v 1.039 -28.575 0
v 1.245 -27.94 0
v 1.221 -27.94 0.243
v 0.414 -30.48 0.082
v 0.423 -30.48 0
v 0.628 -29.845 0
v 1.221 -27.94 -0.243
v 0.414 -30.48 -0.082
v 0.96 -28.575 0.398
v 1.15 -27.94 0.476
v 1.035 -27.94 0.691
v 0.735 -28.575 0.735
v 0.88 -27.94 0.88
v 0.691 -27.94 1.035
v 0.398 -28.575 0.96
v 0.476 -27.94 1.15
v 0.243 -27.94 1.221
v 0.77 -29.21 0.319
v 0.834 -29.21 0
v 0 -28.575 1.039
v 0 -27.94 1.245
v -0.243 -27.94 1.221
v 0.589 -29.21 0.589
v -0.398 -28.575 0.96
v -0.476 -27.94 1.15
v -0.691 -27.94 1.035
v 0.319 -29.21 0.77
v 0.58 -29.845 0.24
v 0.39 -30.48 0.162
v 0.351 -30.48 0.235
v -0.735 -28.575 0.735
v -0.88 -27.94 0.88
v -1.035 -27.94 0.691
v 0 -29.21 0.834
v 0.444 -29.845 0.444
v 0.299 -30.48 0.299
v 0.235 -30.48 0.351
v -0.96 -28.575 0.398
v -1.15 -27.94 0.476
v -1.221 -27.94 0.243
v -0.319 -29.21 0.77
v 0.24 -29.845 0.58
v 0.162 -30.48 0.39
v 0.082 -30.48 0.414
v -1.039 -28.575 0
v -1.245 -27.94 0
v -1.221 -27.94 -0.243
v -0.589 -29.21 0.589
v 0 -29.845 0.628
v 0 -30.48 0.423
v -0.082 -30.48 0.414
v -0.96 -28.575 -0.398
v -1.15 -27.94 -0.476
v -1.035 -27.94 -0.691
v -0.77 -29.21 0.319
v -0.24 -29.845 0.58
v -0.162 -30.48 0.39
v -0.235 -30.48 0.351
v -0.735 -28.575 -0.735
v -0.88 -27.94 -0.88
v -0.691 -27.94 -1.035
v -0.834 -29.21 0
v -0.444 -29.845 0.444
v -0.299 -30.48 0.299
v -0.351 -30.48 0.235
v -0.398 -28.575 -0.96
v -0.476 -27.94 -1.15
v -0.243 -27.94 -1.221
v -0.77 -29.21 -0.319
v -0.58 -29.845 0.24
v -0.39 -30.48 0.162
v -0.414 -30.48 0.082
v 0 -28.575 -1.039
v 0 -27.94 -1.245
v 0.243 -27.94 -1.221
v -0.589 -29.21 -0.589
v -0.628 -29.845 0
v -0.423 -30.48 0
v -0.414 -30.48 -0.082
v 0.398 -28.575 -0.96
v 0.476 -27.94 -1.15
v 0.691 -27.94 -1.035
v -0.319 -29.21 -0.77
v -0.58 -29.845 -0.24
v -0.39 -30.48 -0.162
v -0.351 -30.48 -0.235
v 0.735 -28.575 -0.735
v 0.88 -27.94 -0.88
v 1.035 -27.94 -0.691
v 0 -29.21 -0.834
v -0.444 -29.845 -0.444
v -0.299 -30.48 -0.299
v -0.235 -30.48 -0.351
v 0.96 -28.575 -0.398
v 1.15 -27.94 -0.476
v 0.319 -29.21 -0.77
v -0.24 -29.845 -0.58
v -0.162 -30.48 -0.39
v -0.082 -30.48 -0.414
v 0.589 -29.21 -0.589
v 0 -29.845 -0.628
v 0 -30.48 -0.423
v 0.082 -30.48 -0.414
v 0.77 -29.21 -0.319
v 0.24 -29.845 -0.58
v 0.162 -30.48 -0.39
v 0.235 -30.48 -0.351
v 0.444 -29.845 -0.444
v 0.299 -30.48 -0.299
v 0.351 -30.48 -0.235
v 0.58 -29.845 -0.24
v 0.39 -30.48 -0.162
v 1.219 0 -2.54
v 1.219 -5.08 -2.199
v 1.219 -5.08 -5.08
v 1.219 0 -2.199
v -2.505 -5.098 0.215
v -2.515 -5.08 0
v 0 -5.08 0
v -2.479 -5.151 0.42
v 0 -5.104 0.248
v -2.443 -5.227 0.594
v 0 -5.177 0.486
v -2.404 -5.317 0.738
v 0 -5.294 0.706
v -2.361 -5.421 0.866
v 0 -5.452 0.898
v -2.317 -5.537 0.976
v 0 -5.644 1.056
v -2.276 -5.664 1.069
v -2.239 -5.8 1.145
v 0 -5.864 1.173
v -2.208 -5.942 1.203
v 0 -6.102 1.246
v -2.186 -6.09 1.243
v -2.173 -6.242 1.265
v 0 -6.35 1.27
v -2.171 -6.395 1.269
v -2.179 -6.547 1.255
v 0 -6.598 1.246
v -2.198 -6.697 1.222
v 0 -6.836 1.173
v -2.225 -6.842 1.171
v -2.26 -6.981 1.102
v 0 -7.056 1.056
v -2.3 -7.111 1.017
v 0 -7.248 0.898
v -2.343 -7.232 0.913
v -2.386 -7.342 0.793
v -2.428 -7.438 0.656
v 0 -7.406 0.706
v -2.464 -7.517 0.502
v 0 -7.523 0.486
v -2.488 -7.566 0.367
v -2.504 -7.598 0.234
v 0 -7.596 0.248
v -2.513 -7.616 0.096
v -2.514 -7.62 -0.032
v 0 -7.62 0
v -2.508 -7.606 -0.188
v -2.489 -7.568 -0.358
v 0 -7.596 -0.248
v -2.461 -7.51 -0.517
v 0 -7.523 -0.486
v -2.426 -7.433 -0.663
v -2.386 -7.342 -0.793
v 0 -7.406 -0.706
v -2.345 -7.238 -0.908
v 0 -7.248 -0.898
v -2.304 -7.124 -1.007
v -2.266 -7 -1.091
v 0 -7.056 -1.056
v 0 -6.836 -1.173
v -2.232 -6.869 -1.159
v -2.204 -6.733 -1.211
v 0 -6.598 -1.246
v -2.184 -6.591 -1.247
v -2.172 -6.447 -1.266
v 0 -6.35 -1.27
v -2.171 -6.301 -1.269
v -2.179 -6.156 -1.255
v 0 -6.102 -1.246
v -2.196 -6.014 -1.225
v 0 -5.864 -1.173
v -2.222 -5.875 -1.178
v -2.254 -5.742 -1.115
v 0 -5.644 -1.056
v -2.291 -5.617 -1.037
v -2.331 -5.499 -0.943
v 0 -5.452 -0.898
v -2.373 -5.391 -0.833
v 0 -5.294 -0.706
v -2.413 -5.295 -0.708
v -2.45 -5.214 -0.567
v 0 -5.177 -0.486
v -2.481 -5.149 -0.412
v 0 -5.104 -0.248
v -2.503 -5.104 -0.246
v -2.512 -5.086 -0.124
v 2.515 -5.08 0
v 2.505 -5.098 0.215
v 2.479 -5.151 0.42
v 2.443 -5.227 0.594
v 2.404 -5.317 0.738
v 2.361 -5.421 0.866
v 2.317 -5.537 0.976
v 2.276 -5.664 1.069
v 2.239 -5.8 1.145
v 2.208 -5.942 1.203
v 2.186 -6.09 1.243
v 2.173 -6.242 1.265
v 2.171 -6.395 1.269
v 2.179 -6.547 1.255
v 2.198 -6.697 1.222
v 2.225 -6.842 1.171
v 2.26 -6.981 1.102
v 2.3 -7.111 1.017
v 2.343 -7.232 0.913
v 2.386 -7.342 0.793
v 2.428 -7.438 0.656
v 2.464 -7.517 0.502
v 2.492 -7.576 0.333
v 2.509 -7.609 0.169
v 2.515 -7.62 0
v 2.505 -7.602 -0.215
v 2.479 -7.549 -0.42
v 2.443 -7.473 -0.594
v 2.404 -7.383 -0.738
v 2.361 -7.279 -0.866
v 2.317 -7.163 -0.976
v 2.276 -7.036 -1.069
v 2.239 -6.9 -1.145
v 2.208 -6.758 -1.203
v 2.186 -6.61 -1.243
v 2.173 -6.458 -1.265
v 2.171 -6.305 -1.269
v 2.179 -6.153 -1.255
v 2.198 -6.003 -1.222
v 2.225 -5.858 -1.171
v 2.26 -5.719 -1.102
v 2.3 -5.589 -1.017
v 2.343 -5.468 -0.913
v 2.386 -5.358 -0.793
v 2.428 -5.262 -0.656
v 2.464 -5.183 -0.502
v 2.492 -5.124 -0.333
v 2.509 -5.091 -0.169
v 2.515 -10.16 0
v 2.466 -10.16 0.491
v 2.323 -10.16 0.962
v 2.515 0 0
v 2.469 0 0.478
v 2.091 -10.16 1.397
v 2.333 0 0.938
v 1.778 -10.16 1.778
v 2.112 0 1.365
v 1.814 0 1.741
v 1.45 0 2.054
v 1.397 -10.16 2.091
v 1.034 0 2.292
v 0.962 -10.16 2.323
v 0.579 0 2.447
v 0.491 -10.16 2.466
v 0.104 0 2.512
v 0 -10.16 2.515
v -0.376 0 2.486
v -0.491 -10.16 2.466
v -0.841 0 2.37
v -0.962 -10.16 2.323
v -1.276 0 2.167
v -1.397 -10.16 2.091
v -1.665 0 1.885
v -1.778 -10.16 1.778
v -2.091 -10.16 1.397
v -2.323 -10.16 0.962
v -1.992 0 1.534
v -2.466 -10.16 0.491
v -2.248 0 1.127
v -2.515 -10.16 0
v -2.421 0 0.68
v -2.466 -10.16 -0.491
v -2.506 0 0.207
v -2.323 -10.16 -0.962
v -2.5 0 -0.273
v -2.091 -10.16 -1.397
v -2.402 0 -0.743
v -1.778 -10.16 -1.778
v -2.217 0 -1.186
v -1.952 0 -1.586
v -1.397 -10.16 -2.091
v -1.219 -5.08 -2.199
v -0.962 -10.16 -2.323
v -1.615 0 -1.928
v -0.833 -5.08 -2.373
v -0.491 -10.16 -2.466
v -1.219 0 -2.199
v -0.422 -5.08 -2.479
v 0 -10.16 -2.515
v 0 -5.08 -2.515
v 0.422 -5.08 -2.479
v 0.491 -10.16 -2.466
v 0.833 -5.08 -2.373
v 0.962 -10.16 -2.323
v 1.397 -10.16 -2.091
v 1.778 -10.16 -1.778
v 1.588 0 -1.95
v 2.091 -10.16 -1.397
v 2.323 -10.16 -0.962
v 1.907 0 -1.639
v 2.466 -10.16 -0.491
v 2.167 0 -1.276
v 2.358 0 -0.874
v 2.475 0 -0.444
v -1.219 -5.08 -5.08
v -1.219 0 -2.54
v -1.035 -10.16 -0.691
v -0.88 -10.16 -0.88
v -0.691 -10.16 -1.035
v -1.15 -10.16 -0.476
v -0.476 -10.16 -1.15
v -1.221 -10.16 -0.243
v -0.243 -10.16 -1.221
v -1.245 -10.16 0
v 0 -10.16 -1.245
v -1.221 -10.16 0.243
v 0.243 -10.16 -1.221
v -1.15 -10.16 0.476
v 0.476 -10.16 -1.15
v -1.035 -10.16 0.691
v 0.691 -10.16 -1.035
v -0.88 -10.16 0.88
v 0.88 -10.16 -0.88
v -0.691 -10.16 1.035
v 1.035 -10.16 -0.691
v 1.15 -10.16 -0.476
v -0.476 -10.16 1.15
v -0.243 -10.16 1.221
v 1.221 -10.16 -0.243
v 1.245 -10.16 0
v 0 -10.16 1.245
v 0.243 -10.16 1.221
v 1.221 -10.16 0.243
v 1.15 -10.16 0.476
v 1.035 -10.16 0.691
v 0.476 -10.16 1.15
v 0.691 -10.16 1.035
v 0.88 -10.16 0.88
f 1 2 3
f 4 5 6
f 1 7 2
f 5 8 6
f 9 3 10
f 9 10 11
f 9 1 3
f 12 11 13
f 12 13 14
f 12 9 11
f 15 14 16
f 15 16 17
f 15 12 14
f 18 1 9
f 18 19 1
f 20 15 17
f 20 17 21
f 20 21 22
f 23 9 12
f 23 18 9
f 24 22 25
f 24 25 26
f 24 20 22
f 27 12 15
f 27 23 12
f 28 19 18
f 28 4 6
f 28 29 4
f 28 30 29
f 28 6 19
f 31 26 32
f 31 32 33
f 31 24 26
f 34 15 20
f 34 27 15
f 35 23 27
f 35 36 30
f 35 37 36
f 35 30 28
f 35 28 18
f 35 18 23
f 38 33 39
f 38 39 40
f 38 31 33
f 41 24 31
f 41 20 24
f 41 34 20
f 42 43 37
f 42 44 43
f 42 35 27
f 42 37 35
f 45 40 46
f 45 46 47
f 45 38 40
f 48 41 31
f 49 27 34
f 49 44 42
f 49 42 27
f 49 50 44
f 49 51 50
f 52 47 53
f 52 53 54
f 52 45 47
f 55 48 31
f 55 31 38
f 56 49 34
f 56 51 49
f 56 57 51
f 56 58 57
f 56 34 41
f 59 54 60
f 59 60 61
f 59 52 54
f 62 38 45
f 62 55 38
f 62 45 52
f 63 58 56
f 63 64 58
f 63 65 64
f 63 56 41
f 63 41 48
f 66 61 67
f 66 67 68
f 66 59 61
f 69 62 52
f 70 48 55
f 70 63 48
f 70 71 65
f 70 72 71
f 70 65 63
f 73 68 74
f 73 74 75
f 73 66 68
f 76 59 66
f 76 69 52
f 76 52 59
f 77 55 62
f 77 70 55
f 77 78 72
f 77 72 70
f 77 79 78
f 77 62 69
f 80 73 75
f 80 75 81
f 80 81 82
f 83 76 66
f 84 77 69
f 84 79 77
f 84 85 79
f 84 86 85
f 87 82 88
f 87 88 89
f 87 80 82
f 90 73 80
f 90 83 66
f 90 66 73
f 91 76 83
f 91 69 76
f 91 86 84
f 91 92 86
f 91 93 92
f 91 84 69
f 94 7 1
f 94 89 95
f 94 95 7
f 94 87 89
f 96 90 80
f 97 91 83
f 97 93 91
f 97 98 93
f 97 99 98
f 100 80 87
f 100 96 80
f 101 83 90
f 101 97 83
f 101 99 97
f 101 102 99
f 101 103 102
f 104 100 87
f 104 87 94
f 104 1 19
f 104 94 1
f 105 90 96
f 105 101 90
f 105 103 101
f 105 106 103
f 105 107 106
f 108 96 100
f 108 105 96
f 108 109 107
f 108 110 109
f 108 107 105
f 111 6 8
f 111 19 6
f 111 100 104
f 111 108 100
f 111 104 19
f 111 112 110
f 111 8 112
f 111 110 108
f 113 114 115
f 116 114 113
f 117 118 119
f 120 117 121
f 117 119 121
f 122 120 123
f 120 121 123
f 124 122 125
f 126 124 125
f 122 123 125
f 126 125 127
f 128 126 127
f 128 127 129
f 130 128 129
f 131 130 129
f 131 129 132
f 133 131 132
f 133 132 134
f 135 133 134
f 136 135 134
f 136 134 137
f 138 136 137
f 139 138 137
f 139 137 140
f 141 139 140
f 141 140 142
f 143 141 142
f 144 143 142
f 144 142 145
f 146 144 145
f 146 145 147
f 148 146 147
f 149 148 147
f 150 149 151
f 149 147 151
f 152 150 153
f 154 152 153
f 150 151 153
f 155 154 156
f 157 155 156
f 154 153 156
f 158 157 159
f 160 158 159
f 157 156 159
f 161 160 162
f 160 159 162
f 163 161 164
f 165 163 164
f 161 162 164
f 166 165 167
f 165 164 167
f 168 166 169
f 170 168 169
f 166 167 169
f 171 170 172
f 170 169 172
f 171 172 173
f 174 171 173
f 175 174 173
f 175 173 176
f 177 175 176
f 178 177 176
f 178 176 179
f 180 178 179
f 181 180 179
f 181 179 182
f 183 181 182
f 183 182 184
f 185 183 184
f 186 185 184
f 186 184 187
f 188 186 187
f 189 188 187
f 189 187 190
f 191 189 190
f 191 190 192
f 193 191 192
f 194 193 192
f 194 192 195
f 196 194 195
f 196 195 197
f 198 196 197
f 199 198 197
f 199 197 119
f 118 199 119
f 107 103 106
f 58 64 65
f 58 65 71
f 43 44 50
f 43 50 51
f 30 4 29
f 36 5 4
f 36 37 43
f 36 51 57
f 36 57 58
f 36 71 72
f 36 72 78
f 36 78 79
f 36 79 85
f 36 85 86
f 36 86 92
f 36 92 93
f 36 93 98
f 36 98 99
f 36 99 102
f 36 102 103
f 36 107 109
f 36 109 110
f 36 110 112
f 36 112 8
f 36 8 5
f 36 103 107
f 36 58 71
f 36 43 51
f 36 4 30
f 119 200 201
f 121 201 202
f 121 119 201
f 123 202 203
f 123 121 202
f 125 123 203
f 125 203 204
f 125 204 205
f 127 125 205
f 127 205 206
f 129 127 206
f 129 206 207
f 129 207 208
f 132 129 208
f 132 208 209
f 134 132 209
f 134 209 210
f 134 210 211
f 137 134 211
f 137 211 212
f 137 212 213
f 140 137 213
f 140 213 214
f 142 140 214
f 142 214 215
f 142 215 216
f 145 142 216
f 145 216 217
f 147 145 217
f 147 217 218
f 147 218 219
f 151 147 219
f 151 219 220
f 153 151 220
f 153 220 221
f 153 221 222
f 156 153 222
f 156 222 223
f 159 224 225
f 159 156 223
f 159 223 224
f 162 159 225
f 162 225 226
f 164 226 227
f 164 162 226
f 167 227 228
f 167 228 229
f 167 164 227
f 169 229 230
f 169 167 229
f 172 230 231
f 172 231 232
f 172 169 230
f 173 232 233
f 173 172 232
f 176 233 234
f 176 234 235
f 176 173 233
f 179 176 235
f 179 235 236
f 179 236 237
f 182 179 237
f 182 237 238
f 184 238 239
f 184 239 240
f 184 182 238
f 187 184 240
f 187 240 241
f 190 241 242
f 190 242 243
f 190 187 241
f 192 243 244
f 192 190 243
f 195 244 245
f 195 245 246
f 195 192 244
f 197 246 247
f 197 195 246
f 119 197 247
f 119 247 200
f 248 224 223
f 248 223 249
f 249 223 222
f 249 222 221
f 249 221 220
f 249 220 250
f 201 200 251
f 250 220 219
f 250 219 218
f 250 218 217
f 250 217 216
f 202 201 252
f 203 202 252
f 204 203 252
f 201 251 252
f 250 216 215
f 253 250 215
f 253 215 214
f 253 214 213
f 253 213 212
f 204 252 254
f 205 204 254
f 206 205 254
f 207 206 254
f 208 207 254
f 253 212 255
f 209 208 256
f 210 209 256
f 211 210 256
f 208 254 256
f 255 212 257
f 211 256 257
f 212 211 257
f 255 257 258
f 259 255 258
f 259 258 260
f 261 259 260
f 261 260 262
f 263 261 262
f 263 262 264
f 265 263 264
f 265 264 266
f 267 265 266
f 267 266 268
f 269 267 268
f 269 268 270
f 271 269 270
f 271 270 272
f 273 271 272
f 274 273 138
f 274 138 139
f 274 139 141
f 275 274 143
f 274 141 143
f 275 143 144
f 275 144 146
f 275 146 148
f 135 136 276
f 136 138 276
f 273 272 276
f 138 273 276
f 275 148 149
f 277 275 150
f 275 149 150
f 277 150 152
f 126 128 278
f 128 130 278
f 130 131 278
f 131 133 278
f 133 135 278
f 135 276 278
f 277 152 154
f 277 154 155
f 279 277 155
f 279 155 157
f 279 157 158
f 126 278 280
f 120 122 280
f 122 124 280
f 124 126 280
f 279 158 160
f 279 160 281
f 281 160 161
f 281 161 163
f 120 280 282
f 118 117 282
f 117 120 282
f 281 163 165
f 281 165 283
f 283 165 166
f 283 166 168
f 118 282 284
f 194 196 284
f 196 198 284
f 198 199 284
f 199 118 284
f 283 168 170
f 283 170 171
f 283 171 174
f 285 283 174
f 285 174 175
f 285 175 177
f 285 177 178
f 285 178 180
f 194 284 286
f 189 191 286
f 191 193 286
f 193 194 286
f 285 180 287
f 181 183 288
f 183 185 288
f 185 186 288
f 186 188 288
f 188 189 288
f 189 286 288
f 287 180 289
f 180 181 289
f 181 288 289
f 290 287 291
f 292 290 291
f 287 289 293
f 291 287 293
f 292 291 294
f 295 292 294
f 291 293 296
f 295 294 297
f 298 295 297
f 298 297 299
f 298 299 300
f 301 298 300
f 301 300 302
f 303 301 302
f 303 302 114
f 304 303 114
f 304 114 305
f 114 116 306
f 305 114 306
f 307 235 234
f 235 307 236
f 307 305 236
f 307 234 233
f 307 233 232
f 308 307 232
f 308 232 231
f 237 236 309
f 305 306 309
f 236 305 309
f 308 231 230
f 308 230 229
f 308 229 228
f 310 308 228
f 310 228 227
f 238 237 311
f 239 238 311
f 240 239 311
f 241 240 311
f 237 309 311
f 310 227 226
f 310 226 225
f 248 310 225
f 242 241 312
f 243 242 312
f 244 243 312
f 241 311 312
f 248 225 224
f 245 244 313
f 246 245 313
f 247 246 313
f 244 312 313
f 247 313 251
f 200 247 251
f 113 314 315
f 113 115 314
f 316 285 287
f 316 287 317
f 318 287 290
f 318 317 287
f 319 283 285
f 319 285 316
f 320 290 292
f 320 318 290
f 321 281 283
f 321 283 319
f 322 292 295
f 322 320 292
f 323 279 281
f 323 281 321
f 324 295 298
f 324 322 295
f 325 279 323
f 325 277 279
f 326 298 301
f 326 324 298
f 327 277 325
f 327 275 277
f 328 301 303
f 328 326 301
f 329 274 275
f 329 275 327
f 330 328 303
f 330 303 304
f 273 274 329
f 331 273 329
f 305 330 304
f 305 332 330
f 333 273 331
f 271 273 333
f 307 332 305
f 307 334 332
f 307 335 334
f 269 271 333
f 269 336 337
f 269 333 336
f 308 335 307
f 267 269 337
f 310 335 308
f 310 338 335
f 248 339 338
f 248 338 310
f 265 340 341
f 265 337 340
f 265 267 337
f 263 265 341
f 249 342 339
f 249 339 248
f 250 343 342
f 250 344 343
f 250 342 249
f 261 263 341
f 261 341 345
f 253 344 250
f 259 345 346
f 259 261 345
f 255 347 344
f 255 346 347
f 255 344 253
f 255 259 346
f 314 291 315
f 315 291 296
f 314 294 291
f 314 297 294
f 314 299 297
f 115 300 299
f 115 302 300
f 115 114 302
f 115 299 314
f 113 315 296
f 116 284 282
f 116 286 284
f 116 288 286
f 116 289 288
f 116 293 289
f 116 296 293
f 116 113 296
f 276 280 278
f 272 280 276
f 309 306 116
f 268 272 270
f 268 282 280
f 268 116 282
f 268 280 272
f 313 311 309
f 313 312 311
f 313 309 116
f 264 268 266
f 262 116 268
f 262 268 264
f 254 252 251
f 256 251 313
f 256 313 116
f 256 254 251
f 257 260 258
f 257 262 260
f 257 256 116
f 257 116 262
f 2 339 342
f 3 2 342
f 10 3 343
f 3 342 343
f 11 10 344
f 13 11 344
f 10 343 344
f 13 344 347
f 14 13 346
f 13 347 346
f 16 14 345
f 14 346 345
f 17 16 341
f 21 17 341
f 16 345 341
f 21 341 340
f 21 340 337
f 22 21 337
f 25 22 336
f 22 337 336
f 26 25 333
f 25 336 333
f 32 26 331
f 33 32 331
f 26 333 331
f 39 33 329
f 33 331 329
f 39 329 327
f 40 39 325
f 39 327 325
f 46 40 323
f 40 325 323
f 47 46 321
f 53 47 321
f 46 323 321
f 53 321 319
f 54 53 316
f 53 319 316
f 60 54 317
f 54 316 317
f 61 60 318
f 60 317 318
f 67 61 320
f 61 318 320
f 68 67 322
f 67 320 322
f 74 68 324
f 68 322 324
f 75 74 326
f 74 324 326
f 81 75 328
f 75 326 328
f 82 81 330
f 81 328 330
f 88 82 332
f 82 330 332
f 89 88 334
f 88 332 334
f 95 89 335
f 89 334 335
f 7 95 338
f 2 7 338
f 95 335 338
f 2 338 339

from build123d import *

# Parameters (mm, degrees)
F0_R      = 2.5146
F1_DEPTH  = 10.16
F2_R      = 1.2446
F3_DEPTH  = 17.78
F3_FACE_R = 1.2446
F5_R      = 0.422561
F7_R      = 1.27
F8_DEPTH  = 25.4
F9_DEPTH  = 25.4
F11_DEPTH = 1.2192
F12_DEPTH = 1.2192


with BuildPart() as f1:
    # F0 (on Front) → F1 (new body)
    with BuildSketch(Plane.XZ):
        Circle(F0_R)
    extrude(amount=F1_DEPTH)

    # F2 (on face) → F3 (join)
    with BuildSketch(Plane.XZ.offset(10.16)):
        Circle(F2_R)
    extrude(amount=F3_DEPTH)

    # F3_face (on face) → F6 section 0
    with BuildSketch(Plane.XZ.offset(27.94)):
        Circle(F3_FACE_R)
    # F5 (on offset) → F6 section 1
    with BuildSketch(Plane.XZ.offset(30.48)):
        Circle(F5_R)
    loft()

    # F7 (on Right) → F8 (cut)
    with BuildSketch(Plane.YZ):
        with Locations((-6.35, 0)):
            Circle(F7_R)
    extrude(amount=-F8_DEPTH, mode=Mode.SUBTRACT)

    # F7 (on Right) → F9 (cut)
    with BuildSketch(Plane.YZ):
        with Locations((-6.35, 0)):
            Circle(F7_R)
    extrude(amount=F9_DEPTH, mode=Mode.SUBTRACT)

    # F10 (on Right) → F11 (join)
    with BuildSketch(Plane.YZ):
        Polygon((0, -2.54), (0, 0), (-5.08, 0), (-5.08, -2.54), (-5.08, -5.08), align=None)
    extrude(amount=F11_DEPTH)

    # F10 (on Right) → F12 (join)
    with BuildSketch(Plane.YZ):
        Polygon((0, -2.54), (0, 0), (-5.08, 0), (-5.08, -2.54), (-5.08, -5.08), align=None)
    extrude(amount=-F12_DEPTH)


solid = f1.part
